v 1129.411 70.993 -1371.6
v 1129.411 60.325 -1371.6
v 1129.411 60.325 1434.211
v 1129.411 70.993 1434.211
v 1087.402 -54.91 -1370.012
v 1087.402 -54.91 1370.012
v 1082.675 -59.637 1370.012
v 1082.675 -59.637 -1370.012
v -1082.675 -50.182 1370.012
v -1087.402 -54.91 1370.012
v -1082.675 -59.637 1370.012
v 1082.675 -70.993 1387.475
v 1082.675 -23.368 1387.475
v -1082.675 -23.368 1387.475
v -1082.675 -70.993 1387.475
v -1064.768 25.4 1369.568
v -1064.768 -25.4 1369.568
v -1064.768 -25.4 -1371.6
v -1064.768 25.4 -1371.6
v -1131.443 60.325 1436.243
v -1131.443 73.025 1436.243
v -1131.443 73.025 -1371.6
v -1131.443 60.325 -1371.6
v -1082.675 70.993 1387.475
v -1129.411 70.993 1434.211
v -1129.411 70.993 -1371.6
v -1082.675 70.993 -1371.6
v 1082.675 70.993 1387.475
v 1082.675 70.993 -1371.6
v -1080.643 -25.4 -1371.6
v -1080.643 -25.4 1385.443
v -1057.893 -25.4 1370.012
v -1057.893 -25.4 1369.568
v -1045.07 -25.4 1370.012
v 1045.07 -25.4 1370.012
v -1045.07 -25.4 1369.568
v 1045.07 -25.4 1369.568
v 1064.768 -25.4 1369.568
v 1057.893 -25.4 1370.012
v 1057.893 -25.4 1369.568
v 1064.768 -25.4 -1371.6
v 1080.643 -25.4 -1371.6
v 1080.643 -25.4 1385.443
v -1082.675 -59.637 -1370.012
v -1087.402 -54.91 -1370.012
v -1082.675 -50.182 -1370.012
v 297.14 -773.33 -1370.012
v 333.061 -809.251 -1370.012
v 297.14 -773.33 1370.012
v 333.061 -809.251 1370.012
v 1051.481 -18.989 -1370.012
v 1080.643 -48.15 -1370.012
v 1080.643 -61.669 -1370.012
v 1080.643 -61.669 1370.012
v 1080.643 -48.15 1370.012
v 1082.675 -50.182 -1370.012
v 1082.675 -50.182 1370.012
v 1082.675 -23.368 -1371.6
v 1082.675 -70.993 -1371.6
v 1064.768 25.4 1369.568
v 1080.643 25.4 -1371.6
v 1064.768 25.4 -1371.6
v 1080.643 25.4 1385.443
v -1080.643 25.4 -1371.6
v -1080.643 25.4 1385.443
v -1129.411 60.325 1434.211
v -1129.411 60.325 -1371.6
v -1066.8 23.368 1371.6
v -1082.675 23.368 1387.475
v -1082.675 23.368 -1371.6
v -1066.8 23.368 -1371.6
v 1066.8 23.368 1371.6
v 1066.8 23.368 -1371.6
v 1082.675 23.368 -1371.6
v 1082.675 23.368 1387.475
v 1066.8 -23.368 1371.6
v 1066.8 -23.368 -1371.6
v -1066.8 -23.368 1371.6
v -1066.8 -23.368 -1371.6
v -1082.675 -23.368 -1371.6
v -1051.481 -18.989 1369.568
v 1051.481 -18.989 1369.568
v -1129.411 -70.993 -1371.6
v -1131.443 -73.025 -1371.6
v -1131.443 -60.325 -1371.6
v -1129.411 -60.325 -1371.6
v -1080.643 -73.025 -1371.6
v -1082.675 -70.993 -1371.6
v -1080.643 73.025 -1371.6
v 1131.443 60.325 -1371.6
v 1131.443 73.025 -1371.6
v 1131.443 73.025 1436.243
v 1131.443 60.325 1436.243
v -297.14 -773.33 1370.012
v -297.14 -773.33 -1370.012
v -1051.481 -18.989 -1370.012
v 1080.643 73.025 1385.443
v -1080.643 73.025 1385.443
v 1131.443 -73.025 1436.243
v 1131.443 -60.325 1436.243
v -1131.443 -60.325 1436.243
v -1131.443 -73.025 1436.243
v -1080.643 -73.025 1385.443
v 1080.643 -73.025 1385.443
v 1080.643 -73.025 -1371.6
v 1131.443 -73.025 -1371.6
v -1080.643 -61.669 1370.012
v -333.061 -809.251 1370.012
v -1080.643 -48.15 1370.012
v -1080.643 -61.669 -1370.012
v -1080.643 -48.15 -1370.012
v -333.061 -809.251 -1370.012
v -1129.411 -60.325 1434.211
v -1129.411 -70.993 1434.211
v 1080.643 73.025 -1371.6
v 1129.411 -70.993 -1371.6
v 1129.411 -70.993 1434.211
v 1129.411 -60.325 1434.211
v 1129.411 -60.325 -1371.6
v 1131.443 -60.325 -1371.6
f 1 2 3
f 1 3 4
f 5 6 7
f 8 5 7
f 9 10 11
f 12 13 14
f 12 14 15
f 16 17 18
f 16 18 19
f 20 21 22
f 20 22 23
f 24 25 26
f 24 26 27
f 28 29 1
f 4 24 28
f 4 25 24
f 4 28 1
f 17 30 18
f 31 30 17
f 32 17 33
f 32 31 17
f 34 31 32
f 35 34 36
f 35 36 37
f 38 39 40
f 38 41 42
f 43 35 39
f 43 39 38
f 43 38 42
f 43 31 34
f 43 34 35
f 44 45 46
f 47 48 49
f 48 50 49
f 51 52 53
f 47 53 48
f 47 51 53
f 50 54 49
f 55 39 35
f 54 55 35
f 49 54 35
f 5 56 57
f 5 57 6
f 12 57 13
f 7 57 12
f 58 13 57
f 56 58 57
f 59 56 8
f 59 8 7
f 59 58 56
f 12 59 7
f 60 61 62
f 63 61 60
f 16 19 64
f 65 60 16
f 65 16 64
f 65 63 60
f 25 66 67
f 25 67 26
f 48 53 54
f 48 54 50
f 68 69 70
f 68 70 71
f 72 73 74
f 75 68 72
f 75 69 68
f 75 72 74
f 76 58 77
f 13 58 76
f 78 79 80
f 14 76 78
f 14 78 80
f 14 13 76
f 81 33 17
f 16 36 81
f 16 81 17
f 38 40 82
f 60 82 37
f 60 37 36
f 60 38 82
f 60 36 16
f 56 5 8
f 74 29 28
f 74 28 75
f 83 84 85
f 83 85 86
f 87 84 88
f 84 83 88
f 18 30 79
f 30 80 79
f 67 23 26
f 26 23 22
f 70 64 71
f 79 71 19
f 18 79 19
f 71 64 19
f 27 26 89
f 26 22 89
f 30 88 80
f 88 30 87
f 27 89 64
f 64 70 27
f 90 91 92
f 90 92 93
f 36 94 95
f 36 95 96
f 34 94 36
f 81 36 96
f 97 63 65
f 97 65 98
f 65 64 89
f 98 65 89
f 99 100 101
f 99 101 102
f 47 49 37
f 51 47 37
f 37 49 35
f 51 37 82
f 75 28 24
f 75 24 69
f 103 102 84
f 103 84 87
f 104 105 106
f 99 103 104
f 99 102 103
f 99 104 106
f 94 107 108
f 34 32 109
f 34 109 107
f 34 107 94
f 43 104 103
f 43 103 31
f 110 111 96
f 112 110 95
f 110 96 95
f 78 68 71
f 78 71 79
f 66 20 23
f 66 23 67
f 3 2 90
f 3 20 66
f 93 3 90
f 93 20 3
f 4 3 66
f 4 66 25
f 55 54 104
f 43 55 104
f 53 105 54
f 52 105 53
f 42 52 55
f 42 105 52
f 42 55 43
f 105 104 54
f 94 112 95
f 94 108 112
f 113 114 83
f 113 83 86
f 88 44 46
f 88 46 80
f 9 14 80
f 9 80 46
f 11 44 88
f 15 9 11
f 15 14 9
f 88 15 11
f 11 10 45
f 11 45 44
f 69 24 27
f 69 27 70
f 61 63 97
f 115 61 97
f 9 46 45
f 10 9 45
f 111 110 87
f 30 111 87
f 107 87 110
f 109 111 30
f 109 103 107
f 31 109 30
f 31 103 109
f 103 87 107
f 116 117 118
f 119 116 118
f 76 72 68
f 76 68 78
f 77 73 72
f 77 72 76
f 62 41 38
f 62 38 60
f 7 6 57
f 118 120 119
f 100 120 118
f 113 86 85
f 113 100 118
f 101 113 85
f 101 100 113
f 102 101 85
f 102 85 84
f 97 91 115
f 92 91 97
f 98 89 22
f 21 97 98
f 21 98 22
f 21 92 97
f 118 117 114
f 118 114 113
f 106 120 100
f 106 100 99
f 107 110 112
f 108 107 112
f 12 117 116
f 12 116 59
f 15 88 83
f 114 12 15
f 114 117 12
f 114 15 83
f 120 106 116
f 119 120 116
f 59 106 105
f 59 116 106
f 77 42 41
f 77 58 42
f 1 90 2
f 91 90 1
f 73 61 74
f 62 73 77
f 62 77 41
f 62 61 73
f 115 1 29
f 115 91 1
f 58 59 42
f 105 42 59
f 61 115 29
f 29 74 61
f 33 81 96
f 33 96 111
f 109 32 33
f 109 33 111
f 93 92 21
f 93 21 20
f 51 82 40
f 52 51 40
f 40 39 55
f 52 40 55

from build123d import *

# Parameters (mm, degrees)
F5_DEPTH = 1370.0125


# Not quite as in the source:
# - a variable given as a bare number and used for a length is read in inches; the dataset says mm whatever the document's units were


with BuildPart() as f3:
    # F3: sweep along a path in F1
    with BuildLine(Plane.XZ) as f3_path:
        Line((-1066.8, -1371.6), (-1066.8, 1371.6))
        Line((-1066.8, 1371.6), (1066.8, 1371.6))
        Line((1066.8, 1371.6), (1066.8, -1371.6))
    # F2 (on Top) → F3 (sweep)
    with BuildSketch(Plane.XY):
        Polygon((-1082.675, 23.368), (-1066.8, 23.368), (-1066.8, -23.368), (-1082.675, -23.368), (-1082.675, -70.993), (-1129.411, -70.993), (-1129.411, -60.325), (-1131.443, -60.325), (-1131.443, -73.025), (-1080.643, -73.025), (-1080.643, -25.4), (-1064.768, -25.4), (-1064.768, 25.4), (-1080.643, 25.4), (-1080.643, 73.025), (-1131.443, 73.025), (-1131.443, 60.325), (-1129.411, 60.325), (-1129.411, 70.993), (-1082.675, 70.993), align=None)
    sweep(path=f3_path.line, transition=Transition.RIGHT)

    # F4 (on Top) → F5 (join, symmetric)
    with BuildSketch(Plane.XY):
        Polygon((-297.1398050959, -773.3301995265), (-1051.4813192657, -18.9886853567), (-1087.40234375, -54.909709841), (-333.0608295802, -809.2512240108), align=None)
    extrude(amount=F5_DEPTH, both=True)

    # F6: F3 across plane


with BuildPart() as f3_1:
    add(f3.part)
    add(f3.part.mirror(Plane.YZ))


solid = f3_1.part
